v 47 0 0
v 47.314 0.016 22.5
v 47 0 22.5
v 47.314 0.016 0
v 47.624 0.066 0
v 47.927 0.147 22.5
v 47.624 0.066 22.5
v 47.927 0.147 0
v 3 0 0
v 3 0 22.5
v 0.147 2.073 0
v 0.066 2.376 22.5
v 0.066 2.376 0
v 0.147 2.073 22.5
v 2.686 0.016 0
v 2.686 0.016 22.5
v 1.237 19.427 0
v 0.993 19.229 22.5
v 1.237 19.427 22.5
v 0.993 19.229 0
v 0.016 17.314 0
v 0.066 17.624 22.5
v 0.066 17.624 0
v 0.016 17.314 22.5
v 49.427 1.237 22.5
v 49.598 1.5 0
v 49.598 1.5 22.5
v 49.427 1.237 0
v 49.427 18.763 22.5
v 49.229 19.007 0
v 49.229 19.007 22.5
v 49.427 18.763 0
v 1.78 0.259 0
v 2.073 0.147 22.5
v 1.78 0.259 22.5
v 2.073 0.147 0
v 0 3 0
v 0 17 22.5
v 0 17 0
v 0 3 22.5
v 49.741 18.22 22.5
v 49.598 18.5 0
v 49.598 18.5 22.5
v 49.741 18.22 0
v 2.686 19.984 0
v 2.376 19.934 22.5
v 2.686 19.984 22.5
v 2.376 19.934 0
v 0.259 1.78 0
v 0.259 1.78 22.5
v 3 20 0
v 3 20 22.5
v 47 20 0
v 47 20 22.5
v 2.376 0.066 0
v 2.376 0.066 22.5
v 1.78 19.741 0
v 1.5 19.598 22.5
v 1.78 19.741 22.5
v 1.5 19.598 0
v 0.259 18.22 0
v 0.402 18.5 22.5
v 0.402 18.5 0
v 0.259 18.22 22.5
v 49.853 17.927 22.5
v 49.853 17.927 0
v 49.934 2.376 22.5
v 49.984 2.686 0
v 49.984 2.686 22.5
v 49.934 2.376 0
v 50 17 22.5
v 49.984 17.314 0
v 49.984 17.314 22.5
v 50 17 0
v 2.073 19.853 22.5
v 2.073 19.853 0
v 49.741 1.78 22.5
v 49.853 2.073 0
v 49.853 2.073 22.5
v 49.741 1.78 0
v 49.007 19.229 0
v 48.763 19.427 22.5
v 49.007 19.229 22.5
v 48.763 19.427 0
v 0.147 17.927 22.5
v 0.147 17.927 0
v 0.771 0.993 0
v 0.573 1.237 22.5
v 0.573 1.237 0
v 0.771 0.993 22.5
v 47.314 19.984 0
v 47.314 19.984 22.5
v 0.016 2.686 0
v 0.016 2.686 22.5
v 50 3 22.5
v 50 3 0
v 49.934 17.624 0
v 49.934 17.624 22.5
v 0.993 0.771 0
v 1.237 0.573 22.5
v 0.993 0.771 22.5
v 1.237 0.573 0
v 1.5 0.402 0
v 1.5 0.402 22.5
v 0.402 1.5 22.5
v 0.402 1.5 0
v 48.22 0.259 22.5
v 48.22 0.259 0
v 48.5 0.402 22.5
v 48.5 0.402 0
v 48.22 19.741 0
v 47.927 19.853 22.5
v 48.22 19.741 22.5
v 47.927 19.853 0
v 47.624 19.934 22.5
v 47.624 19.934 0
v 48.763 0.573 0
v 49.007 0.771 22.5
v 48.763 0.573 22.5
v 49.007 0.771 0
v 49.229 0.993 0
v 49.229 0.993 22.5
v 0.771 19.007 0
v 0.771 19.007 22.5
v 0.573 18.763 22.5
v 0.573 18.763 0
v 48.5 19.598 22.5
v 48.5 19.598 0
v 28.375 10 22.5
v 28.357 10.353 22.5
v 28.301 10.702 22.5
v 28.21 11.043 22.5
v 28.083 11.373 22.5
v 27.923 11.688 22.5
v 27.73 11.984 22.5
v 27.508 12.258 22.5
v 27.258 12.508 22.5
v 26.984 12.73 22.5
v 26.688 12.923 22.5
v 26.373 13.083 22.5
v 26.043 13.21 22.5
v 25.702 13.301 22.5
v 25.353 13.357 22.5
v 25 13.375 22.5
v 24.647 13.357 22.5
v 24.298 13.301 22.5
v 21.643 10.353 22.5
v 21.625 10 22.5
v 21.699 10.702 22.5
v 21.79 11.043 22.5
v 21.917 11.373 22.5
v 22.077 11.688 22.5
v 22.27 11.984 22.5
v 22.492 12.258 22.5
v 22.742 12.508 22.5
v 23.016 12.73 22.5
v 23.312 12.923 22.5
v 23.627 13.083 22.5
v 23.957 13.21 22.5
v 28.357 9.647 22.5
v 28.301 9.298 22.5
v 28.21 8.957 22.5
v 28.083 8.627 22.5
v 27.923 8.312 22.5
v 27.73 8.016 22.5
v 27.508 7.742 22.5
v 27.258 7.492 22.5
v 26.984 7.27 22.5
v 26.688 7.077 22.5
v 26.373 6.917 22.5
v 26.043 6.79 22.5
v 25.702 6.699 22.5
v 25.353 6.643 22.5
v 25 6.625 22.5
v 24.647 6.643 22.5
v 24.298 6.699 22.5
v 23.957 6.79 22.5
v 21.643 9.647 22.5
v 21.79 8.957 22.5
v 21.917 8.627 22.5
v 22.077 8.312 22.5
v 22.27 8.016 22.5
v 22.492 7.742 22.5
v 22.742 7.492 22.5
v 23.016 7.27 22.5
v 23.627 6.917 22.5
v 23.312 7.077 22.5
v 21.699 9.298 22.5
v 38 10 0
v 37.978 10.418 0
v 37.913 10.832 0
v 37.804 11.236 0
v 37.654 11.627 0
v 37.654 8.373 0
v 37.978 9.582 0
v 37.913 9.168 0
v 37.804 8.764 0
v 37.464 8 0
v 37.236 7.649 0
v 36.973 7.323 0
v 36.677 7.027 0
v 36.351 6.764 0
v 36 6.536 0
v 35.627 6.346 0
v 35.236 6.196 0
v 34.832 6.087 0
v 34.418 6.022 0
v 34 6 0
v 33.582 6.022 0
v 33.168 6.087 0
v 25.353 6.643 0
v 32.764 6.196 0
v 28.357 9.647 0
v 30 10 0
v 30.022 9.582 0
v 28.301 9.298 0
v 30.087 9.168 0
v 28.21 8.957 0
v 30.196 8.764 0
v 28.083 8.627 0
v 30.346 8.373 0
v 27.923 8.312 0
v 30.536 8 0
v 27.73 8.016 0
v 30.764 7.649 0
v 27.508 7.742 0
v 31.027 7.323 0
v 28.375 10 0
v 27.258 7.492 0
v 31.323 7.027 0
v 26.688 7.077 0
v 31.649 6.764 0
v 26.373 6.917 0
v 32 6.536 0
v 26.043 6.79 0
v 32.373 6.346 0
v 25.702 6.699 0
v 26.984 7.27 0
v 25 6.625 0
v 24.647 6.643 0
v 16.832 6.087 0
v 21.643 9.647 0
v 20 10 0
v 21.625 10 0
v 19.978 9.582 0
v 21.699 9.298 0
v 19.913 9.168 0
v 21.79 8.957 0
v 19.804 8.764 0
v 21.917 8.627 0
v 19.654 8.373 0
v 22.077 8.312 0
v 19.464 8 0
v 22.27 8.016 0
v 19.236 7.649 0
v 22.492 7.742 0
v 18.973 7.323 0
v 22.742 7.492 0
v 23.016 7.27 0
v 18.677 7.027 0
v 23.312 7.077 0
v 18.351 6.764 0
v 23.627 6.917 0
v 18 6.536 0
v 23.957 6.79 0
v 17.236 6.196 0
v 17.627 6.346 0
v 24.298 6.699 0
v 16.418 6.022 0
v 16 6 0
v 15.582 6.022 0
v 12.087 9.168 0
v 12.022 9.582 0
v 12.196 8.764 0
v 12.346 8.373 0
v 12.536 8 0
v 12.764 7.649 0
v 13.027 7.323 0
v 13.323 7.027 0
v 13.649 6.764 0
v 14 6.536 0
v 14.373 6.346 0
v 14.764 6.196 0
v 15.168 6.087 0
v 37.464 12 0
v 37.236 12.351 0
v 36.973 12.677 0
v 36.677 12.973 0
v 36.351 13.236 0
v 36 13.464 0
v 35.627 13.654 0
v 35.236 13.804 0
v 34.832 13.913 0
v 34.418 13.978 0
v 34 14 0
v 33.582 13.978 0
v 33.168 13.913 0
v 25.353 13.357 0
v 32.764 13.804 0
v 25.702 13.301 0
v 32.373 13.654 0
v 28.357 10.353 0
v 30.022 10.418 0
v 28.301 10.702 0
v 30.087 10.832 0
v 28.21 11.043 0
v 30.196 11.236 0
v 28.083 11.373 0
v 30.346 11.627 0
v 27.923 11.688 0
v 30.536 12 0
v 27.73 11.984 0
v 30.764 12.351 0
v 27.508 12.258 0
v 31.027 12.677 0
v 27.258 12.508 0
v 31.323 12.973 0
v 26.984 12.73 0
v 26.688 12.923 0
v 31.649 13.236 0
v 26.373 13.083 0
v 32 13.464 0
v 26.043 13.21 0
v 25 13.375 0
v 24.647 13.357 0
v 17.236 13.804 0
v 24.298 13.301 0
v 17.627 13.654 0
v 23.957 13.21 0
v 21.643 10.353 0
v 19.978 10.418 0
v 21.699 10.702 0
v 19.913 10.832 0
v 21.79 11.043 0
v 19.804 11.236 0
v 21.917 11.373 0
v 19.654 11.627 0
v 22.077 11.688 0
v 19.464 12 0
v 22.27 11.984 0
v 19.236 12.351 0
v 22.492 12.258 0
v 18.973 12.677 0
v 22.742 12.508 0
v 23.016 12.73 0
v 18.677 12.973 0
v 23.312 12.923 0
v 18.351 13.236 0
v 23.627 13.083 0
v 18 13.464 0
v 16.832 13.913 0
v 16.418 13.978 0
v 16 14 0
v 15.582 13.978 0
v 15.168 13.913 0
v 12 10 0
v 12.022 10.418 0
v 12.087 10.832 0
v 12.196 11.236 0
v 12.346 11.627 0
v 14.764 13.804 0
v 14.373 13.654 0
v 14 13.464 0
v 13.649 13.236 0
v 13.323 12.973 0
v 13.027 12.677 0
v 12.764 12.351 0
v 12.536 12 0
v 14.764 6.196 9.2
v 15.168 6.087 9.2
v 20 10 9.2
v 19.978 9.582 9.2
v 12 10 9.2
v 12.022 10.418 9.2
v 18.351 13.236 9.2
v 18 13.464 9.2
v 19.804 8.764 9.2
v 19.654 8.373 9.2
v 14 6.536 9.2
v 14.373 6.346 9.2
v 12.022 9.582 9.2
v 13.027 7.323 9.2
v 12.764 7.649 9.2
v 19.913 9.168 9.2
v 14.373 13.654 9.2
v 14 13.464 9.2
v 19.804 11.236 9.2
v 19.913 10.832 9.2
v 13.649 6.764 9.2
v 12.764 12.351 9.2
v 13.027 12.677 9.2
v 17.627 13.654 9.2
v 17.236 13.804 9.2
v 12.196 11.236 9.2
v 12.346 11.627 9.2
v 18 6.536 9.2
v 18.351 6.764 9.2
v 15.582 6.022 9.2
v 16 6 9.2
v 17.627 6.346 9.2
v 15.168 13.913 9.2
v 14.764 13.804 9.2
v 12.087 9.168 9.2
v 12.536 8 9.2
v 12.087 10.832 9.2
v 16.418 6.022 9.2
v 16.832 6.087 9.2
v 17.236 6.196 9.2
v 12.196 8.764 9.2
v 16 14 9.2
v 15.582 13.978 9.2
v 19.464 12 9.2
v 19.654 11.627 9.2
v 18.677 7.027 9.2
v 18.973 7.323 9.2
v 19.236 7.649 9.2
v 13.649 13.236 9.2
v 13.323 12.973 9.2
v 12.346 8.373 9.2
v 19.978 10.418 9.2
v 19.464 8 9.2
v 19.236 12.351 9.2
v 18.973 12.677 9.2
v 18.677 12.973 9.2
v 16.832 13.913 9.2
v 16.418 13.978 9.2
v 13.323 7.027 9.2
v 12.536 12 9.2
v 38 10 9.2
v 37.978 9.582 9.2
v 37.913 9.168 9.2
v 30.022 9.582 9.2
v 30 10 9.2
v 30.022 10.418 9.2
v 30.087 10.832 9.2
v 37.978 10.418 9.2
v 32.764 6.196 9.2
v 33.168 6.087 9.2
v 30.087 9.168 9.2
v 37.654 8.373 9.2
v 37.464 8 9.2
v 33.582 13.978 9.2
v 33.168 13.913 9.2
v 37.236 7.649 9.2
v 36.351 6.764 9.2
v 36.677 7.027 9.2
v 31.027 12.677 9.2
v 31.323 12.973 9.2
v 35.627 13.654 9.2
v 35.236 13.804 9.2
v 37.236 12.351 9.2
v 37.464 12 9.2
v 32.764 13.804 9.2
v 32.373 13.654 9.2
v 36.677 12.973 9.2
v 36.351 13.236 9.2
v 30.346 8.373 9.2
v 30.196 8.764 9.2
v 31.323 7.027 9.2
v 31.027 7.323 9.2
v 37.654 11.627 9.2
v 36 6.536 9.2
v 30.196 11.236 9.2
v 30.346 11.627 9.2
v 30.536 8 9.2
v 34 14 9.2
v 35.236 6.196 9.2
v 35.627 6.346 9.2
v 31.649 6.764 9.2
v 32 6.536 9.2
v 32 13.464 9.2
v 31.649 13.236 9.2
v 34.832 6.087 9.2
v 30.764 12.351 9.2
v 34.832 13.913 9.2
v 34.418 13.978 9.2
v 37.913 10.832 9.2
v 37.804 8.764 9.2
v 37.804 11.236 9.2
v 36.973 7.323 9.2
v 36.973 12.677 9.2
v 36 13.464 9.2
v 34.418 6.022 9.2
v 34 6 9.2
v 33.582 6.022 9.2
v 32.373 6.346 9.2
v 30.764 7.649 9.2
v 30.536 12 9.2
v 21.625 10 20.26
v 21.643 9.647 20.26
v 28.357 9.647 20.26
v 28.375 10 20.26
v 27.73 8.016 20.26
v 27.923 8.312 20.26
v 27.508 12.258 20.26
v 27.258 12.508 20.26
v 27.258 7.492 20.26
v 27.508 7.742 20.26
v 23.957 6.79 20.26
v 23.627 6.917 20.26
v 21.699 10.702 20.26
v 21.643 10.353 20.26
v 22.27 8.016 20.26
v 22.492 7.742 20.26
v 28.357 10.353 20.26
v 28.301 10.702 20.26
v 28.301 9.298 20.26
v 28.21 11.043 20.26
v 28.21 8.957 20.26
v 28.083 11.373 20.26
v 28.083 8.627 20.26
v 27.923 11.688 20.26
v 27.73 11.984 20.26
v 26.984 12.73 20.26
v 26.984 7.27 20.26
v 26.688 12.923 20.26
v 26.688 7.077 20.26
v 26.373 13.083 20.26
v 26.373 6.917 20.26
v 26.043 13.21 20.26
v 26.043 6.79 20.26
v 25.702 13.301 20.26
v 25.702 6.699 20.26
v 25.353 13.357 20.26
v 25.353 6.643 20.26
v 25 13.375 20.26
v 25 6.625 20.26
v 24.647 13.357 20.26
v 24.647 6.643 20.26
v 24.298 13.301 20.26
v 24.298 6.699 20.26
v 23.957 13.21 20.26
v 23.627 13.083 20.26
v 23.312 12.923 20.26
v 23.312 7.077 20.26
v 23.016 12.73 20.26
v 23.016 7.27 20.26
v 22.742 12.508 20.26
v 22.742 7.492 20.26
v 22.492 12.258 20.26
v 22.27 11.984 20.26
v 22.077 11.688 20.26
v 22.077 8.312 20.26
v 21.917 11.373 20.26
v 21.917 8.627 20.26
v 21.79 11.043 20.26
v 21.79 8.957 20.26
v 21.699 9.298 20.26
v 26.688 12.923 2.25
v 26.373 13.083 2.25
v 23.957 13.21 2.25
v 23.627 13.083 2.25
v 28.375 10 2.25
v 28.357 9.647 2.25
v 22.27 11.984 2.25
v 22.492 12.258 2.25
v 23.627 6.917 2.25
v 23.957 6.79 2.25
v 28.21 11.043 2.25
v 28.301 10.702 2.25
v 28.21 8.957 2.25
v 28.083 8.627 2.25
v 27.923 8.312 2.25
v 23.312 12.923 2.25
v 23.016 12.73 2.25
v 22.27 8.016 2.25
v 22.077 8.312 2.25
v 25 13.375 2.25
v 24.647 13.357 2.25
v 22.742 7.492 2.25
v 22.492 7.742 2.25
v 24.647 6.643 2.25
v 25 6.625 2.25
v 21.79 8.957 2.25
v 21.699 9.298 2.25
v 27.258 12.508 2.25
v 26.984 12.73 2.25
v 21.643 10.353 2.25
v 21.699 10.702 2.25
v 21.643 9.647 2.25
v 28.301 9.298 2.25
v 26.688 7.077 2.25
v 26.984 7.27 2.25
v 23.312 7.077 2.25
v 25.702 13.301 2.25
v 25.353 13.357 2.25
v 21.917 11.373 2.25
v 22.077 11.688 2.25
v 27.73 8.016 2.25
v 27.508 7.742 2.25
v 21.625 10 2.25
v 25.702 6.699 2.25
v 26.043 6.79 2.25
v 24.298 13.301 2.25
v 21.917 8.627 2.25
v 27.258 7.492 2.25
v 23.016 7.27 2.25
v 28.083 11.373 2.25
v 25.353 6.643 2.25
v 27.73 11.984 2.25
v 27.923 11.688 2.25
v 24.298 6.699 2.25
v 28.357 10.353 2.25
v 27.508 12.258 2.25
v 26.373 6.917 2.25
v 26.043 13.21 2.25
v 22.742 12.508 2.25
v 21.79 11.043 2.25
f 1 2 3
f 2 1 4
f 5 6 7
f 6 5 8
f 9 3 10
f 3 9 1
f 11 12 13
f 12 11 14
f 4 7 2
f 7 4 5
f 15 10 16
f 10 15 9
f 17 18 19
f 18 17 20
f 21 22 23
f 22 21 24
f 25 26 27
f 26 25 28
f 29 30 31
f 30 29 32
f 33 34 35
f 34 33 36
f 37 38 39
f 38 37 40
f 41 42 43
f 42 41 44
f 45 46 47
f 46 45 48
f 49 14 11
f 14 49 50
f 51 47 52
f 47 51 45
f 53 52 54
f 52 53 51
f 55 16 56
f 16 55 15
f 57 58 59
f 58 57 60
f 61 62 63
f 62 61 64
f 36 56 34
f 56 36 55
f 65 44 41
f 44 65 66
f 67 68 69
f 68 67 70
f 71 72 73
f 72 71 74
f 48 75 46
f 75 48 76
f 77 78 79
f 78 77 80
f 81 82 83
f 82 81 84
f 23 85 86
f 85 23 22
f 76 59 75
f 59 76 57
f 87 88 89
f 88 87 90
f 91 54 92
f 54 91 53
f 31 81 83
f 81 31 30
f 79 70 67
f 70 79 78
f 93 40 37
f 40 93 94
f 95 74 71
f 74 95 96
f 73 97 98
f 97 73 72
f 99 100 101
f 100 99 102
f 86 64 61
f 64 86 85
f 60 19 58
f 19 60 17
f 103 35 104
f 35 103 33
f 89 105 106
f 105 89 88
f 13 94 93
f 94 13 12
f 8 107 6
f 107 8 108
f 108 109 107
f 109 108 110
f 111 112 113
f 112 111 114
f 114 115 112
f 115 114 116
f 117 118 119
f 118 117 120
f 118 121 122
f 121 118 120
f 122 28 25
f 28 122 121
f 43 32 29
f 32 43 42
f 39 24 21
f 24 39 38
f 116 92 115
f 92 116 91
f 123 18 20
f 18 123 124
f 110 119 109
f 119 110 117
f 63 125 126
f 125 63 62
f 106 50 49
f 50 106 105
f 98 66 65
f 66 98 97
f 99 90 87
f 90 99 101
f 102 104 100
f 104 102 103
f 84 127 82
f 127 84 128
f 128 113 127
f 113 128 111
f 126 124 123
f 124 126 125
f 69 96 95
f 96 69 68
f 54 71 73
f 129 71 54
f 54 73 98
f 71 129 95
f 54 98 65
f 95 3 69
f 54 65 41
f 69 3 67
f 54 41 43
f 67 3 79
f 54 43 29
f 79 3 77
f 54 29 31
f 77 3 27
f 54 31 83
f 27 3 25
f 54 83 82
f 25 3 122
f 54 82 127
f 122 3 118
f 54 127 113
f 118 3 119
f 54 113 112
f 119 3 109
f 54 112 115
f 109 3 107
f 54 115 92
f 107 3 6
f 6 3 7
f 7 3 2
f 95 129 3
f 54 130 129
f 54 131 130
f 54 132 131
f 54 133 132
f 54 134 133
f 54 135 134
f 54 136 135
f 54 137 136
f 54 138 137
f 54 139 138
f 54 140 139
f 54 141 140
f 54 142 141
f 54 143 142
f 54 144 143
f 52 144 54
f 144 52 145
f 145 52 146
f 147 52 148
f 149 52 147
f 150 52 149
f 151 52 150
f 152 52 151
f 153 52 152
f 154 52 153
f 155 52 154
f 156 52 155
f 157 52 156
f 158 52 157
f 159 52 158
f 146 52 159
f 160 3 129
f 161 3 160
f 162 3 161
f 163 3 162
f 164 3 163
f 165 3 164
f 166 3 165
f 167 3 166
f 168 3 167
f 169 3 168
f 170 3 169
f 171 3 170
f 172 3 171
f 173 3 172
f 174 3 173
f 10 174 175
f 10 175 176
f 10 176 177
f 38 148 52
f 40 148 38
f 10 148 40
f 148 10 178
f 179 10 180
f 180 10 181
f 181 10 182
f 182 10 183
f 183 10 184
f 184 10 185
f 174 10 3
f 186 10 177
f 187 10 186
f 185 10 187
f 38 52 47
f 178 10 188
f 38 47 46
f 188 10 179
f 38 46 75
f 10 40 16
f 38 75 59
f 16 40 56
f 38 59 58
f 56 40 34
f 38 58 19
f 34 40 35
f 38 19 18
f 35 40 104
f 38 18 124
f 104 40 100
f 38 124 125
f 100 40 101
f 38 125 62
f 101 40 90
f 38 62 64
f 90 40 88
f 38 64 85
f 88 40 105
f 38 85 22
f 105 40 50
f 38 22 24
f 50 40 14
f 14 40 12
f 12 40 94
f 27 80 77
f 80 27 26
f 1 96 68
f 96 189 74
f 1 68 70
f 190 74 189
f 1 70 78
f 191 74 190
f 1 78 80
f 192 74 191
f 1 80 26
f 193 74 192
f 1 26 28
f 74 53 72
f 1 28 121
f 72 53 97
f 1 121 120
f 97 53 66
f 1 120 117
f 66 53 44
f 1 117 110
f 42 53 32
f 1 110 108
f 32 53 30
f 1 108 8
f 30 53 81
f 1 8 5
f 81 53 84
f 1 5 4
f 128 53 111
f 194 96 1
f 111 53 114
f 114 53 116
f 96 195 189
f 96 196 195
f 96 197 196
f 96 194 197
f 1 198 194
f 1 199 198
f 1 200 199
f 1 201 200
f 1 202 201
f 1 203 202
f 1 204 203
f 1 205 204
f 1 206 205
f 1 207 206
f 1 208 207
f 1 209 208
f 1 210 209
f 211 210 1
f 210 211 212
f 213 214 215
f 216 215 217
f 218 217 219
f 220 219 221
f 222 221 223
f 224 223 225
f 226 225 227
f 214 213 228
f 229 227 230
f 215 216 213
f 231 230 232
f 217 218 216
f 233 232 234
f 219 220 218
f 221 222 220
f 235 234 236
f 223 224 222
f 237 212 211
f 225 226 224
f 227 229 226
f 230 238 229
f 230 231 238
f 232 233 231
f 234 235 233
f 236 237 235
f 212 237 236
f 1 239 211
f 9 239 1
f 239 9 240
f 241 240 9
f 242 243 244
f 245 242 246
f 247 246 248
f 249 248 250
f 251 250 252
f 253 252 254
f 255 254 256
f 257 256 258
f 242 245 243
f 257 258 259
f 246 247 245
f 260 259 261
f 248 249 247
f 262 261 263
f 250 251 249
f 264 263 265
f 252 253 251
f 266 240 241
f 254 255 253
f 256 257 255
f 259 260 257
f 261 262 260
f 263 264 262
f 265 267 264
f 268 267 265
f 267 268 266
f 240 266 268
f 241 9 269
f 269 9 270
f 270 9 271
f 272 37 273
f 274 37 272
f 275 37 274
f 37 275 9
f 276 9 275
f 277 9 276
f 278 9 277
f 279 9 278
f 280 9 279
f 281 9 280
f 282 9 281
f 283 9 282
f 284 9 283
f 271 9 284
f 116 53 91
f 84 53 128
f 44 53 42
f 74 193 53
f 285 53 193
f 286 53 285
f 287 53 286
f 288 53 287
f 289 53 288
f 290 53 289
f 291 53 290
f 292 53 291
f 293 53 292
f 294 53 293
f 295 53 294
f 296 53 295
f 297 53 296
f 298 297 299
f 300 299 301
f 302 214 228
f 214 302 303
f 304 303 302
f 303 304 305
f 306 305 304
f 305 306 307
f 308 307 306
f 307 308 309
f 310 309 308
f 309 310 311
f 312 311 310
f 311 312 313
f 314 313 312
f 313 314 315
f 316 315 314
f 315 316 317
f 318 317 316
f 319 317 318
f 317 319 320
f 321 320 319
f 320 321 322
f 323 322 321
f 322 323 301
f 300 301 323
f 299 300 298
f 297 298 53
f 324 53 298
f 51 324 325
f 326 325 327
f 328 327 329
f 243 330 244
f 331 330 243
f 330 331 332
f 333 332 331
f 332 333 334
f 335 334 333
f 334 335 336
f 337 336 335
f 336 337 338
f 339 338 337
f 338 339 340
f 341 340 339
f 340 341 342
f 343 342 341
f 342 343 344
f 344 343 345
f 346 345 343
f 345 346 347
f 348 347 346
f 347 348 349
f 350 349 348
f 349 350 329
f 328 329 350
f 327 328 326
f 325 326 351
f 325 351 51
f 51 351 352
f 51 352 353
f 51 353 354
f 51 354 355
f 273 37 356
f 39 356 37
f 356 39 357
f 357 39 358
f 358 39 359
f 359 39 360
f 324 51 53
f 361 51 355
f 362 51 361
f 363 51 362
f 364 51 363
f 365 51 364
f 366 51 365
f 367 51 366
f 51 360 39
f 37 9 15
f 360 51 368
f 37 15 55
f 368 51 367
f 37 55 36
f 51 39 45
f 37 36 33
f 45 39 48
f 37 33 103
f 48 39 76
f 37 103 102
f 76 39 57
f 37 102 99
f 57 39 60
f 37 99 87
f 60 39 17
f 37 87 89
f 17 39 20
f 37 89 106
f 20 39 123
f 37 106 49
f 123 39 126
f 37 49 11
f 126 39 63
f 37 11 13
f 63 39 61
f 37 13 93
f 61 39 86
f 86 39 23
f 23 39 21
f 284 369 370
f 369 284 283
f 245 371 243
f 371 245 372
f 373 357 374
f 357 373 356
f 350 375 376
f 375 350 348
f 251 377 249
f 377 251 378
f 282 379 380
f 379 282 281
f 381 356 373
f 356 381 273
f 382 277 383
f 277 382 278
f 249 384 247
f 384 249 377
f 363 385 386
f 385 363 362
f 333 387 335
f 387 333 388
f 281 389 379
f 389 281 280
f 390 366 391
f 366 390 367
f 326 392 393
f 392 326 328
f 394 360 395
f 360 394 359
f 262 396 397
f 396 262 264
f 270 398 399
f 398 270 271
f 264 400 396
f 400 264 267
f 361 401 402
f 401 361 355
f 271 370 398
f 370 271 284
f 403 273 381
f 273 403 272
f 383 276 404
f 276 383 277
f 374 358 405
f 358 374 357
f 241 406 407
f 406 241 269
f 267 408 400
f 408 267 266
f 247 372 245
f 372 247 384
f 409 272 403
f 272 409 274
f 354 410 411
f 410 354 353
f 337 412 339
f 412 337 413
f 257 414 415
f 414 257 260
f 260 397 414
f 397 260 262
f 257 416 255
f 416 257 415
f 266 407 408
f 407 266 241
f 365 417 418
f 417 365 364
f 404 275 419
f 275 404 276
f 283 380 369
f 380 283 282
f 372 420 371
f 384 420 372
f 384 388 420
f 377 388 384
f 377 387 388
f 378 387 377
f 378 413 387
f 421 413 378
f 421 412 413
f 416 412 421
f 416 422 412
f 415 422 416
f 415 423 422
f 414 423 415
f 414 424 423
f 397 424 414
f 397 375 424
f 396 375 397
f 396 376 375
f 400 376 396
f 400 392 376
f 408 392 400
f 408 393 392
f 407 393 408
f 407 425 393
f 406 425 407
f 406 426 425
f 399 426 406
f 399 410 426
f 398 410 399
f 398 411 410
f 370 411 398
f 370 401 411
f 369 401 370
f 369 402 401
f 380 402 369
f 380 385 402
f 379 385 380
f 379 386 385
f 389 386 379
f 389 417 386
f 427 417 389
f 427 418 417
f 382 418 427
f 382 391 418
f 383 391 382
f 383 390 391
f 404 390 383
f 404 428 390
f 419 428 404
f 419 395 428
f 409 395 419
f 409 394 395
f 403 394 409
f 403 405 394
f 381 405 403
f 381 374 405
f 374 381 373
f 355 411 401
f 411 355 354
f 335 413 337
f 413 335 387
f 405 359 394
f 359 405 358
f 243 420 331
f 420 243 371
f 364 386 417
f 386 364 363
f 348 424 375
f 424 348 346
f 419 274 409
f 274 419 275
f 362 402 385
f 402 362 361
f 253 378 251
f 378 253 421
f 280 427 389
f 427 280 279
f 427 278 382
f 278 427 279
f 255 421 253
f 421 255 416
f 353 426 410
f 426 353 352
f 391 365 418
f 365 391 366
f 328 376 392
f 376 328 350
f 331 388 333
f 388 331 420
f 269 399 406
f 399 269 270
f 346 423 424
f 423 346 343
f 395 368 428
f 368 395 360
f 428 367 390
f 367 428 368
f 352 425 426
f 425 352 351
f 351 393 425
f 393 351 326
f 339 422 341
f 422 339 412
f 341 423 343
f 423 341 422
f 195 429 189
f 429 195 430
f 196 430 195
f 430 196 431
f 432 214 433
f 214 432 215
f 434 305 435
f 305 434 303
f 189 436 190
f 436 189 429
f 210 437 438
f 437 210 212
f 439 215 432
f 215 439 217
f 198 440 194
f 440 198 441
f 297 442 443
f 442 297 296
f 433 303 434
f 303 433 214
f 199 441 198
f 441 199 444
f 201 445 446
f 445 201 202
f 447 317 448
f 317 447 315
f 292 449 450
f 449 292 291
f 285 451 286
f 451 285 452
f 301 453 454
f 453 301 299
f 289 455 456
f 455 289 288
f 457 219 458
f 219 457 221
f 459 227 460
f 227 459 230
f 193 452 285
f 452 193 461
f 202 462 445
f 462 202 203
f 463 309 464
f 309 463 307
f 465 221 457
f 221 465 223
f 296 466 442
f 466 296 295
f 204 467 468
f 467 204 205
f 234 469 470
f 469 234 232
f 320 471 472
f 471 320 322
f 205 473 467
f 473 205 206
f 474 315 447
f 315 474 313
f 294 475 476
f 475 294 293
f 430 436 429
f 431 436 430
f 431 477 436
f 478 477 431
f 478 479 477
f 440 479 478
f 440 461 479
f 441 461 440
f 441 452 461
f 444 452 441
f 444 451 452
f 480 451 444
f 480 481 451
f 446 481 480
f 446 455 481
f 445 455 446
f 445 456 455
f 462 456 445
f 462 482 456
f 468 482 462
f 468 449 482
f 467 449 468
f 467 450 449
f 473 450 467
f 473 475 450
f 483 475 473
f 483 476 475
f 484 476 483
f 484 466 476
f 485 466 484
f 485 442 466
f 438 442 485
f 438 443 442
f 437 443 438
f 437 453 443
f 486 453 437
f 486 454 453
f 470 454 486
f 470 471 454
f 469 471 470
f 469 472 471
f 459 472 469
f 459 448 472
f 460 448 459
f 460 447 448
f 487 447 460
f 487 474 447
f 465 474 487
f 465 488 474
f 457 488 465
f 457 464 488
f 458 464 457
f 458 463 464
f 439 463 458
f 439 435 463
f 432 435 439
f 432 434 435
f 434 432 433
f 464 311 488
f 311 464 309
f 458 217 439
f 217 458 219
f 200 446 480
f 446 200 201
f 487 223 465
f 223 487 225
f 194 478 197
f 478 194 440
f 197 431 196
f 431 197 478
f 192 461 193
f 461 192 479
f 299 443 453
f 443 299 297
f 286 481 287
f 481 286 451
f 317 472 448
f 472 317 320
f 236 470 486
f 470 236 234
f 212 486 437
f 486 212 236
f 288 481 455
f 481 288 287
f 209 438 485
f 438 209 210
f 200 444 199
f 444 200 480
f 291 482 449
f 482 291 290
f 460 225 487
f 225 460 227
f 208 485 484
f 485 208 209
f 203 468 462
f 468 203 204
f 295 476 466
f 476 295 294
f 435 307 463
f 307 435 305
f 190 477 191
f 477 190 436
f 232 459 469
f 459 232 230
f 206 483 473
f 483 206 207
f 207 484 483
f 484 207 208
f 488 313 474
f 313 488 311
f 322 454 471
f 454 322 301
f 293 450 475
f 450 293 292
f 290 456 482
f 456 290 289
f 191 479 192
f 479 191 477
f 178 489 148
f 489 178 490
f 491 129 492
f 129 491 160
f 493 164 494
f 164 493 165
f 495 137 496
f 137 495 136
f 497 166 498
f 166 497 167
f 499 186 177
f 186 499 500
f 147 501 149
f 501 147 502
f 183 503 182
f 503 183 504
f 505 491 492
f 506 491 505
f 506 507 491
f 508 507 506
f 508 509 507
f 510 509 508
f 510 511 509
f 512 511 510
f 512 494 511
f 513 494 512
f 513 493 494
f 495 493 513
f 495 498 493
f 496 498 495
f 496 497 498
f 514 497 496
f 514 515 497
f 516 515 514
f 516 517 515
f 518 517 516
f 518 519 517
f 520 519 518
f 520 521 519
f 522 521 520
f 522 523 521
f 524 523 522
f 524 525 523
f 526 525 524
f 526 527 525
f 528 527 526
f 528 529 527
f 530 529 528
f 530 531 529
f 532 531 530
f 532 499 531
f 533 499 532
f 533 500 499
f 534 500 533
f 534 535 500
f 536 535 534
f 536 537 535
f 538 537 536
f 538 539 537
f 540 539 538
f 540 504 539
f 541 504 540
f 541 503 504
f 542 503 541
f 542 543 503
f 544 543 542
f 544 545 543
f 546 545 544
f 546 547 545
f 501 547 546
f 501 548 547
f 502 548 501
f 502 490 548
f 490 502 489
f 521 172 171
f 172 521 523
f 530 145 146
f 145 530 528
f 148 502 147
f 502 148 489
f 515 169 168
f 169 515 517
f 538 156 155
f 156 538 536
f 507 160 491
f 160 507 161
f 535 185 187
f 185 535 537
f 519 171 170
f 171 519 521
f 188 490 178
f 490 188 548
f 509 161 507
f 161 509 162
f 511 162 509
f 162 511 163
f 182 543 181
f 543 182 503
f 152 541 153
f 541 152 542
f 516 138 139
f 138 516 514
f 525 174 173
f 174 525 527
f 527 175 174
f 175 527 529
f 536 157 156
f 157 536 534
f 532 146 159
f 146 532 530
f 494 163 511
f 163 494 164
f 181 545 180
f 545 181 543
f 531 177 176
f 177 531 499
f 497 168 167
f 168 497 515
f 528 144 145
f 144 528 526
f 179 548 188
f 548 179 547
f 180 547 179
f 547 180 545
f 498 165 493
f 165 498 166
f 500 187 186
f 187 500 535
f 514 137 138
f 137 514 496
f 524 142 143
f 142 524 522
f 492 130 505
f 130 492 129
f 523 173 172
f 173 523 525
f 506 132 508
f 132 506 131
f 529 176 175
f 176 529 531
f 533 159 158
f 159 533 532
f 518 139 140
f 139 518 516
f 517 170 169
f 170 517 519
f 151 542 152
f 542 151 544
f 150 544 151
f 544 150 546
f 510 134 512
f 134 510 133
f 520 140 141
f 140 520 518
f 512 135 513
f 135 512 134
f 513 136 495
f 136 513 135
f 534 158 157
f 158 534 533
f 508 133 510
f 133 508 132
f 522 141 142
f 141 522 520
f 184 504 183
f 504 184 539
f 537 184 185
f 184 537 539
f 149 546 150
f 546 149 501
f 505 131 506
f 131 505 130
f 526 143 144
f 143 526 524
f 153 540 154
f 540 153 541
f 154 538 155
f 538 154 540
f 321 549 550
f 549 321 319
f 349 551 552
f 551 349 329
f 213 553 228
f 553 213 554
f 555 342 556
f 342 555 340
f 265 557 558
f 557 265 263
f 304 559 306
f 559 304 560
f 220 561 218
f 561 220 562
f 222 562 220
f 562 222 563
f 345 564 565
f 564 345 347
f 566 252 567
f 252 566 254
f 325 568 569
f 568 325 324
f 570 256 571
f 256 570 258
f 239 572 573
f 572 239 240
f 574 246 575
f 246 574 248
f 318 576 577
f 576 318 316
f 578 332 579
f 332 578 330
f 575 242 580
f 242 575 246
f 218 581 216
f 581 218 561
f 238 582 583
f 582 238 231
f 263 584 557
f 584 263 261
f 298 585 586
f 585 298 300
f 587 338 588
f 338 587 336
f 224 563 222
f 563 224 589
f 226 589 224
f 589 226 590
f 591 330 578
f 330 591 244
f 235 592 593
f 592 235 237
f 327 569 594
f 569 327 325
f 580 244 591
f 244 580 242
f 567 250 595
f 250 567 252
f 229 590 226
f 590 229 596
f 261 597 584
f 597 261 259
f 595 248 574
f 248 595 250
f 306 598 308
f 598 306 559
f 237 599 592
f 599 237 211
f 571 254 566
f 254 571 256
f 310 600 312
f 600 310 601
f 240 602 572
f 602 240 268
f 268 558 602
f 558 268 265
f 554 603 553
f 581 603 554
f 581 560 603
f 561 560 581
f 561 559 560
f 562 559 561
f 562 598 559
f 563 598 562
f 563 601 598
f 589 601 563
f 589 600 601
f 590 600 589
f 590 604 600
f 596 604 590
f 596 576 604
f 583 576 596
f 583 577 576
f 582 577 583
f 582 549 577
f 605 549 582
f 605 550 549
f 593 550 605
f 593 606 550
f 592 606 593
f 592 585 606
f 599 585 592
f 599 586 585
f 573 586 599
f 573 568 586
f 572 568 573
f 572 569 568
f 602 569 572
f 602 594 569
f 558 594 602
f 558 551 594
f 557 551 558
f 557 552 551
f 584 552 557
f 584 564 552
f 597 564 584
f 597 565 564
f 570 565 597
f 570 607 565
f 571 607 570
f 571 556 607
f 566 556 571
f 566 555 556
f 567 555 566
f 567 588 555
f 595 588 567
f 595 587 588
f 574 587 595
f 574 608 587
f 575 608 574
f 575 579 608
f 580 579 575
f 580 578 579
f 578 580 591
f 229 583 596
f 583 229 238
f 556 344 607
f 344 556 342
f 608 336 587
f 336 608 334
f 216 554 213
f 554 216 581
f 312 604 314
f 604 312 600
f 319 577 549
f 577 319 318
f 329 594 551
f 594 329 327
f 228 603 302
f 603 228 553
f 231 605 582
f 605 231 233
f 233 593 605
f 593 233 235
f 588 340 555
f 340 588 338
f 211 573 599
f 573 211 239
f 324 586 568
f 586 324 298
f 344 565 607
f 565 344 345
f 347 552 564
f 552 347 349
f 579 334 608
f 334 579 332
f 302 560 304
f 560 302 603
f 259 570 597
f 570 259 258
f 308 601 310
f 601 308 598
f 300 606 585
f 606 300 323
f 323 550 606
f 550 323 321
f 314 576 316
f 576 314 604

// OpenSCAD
$fn = 60;

cont_length = 50;
cont_width = 20;
cont_height = 22.5;

cyl_diameter = 8;
cyl_height = 9.2;

magnet_diameter = 6;
magnet_height = 2;
magnet_d_tol = 0.75; // half on each side (d)
magnet_height_tol = 0.25;

top_cyl_diameter = 6;
top_cyl_height = cyl_height / 2;

dist_to_cyl_edge = 12;
dist_between_cyl = 10;

rounded_offset = 3;

assert(dist_to_cyl_edge + cyl_diameter + dist_between_cyl + cyl_diameter + dist_to_cyl_edge == cont_length);

difference()
{
    // container
    linear_extrude(height = cont_height) translate([ rounded_offset, rounded_offset, 0 ]) offset(rounded_offset)
        square([ cont_length - (rounded_offset * 2), cont_width - (rounded_offset * 2) ]);

    // bottom cylinders
    translate([ dist_to_cyl_edge + (cyl_diameter / 2), cont_width / 2, 0 ]) linear_extrude(height = cyl_height)
        circle(d = cyl_diameter);
    translate([ cont_length - (dist_to_cyl_edge + (cyl_diameter / 2)), cont_width / 2, 0 ])
        linear_extrude(height = cyl_height) circle(d = cyl_diameter);

    // top magnet
    translate([ cont_length / 2, cont_width / 2, cont_height ])
        translate([ 0, 0, -(magnet_height + magnet_height_tol) + 0.01 ])
            linear_extrude(height = magnet_height + magnet_height_tol) circle(d = magnet_diameter + magnet_d_tol);
    // bottom extra magnet
    translate([ cont_length / 2, cont_width / 2, 0 ]) linear_extrude(height = magnet_height + magnet_height_tol)
        translate([ 0, 0, -(magnet_height + magnet_height_tol) ]) circle(d = magnet_diameter + magnet_d_tol);
}

// // top magnet
// color("red") translate([ cont_length / 2, cont_width / 2, cont_height ])
//     translate([ 0, 0, -(magnet_height + magnet_height_tol) + 0.01 ])
//         linear_extrude(height = magnet_height + magnet_height_tol) circle(d = magnet_diameter + magnet_d_tol);
